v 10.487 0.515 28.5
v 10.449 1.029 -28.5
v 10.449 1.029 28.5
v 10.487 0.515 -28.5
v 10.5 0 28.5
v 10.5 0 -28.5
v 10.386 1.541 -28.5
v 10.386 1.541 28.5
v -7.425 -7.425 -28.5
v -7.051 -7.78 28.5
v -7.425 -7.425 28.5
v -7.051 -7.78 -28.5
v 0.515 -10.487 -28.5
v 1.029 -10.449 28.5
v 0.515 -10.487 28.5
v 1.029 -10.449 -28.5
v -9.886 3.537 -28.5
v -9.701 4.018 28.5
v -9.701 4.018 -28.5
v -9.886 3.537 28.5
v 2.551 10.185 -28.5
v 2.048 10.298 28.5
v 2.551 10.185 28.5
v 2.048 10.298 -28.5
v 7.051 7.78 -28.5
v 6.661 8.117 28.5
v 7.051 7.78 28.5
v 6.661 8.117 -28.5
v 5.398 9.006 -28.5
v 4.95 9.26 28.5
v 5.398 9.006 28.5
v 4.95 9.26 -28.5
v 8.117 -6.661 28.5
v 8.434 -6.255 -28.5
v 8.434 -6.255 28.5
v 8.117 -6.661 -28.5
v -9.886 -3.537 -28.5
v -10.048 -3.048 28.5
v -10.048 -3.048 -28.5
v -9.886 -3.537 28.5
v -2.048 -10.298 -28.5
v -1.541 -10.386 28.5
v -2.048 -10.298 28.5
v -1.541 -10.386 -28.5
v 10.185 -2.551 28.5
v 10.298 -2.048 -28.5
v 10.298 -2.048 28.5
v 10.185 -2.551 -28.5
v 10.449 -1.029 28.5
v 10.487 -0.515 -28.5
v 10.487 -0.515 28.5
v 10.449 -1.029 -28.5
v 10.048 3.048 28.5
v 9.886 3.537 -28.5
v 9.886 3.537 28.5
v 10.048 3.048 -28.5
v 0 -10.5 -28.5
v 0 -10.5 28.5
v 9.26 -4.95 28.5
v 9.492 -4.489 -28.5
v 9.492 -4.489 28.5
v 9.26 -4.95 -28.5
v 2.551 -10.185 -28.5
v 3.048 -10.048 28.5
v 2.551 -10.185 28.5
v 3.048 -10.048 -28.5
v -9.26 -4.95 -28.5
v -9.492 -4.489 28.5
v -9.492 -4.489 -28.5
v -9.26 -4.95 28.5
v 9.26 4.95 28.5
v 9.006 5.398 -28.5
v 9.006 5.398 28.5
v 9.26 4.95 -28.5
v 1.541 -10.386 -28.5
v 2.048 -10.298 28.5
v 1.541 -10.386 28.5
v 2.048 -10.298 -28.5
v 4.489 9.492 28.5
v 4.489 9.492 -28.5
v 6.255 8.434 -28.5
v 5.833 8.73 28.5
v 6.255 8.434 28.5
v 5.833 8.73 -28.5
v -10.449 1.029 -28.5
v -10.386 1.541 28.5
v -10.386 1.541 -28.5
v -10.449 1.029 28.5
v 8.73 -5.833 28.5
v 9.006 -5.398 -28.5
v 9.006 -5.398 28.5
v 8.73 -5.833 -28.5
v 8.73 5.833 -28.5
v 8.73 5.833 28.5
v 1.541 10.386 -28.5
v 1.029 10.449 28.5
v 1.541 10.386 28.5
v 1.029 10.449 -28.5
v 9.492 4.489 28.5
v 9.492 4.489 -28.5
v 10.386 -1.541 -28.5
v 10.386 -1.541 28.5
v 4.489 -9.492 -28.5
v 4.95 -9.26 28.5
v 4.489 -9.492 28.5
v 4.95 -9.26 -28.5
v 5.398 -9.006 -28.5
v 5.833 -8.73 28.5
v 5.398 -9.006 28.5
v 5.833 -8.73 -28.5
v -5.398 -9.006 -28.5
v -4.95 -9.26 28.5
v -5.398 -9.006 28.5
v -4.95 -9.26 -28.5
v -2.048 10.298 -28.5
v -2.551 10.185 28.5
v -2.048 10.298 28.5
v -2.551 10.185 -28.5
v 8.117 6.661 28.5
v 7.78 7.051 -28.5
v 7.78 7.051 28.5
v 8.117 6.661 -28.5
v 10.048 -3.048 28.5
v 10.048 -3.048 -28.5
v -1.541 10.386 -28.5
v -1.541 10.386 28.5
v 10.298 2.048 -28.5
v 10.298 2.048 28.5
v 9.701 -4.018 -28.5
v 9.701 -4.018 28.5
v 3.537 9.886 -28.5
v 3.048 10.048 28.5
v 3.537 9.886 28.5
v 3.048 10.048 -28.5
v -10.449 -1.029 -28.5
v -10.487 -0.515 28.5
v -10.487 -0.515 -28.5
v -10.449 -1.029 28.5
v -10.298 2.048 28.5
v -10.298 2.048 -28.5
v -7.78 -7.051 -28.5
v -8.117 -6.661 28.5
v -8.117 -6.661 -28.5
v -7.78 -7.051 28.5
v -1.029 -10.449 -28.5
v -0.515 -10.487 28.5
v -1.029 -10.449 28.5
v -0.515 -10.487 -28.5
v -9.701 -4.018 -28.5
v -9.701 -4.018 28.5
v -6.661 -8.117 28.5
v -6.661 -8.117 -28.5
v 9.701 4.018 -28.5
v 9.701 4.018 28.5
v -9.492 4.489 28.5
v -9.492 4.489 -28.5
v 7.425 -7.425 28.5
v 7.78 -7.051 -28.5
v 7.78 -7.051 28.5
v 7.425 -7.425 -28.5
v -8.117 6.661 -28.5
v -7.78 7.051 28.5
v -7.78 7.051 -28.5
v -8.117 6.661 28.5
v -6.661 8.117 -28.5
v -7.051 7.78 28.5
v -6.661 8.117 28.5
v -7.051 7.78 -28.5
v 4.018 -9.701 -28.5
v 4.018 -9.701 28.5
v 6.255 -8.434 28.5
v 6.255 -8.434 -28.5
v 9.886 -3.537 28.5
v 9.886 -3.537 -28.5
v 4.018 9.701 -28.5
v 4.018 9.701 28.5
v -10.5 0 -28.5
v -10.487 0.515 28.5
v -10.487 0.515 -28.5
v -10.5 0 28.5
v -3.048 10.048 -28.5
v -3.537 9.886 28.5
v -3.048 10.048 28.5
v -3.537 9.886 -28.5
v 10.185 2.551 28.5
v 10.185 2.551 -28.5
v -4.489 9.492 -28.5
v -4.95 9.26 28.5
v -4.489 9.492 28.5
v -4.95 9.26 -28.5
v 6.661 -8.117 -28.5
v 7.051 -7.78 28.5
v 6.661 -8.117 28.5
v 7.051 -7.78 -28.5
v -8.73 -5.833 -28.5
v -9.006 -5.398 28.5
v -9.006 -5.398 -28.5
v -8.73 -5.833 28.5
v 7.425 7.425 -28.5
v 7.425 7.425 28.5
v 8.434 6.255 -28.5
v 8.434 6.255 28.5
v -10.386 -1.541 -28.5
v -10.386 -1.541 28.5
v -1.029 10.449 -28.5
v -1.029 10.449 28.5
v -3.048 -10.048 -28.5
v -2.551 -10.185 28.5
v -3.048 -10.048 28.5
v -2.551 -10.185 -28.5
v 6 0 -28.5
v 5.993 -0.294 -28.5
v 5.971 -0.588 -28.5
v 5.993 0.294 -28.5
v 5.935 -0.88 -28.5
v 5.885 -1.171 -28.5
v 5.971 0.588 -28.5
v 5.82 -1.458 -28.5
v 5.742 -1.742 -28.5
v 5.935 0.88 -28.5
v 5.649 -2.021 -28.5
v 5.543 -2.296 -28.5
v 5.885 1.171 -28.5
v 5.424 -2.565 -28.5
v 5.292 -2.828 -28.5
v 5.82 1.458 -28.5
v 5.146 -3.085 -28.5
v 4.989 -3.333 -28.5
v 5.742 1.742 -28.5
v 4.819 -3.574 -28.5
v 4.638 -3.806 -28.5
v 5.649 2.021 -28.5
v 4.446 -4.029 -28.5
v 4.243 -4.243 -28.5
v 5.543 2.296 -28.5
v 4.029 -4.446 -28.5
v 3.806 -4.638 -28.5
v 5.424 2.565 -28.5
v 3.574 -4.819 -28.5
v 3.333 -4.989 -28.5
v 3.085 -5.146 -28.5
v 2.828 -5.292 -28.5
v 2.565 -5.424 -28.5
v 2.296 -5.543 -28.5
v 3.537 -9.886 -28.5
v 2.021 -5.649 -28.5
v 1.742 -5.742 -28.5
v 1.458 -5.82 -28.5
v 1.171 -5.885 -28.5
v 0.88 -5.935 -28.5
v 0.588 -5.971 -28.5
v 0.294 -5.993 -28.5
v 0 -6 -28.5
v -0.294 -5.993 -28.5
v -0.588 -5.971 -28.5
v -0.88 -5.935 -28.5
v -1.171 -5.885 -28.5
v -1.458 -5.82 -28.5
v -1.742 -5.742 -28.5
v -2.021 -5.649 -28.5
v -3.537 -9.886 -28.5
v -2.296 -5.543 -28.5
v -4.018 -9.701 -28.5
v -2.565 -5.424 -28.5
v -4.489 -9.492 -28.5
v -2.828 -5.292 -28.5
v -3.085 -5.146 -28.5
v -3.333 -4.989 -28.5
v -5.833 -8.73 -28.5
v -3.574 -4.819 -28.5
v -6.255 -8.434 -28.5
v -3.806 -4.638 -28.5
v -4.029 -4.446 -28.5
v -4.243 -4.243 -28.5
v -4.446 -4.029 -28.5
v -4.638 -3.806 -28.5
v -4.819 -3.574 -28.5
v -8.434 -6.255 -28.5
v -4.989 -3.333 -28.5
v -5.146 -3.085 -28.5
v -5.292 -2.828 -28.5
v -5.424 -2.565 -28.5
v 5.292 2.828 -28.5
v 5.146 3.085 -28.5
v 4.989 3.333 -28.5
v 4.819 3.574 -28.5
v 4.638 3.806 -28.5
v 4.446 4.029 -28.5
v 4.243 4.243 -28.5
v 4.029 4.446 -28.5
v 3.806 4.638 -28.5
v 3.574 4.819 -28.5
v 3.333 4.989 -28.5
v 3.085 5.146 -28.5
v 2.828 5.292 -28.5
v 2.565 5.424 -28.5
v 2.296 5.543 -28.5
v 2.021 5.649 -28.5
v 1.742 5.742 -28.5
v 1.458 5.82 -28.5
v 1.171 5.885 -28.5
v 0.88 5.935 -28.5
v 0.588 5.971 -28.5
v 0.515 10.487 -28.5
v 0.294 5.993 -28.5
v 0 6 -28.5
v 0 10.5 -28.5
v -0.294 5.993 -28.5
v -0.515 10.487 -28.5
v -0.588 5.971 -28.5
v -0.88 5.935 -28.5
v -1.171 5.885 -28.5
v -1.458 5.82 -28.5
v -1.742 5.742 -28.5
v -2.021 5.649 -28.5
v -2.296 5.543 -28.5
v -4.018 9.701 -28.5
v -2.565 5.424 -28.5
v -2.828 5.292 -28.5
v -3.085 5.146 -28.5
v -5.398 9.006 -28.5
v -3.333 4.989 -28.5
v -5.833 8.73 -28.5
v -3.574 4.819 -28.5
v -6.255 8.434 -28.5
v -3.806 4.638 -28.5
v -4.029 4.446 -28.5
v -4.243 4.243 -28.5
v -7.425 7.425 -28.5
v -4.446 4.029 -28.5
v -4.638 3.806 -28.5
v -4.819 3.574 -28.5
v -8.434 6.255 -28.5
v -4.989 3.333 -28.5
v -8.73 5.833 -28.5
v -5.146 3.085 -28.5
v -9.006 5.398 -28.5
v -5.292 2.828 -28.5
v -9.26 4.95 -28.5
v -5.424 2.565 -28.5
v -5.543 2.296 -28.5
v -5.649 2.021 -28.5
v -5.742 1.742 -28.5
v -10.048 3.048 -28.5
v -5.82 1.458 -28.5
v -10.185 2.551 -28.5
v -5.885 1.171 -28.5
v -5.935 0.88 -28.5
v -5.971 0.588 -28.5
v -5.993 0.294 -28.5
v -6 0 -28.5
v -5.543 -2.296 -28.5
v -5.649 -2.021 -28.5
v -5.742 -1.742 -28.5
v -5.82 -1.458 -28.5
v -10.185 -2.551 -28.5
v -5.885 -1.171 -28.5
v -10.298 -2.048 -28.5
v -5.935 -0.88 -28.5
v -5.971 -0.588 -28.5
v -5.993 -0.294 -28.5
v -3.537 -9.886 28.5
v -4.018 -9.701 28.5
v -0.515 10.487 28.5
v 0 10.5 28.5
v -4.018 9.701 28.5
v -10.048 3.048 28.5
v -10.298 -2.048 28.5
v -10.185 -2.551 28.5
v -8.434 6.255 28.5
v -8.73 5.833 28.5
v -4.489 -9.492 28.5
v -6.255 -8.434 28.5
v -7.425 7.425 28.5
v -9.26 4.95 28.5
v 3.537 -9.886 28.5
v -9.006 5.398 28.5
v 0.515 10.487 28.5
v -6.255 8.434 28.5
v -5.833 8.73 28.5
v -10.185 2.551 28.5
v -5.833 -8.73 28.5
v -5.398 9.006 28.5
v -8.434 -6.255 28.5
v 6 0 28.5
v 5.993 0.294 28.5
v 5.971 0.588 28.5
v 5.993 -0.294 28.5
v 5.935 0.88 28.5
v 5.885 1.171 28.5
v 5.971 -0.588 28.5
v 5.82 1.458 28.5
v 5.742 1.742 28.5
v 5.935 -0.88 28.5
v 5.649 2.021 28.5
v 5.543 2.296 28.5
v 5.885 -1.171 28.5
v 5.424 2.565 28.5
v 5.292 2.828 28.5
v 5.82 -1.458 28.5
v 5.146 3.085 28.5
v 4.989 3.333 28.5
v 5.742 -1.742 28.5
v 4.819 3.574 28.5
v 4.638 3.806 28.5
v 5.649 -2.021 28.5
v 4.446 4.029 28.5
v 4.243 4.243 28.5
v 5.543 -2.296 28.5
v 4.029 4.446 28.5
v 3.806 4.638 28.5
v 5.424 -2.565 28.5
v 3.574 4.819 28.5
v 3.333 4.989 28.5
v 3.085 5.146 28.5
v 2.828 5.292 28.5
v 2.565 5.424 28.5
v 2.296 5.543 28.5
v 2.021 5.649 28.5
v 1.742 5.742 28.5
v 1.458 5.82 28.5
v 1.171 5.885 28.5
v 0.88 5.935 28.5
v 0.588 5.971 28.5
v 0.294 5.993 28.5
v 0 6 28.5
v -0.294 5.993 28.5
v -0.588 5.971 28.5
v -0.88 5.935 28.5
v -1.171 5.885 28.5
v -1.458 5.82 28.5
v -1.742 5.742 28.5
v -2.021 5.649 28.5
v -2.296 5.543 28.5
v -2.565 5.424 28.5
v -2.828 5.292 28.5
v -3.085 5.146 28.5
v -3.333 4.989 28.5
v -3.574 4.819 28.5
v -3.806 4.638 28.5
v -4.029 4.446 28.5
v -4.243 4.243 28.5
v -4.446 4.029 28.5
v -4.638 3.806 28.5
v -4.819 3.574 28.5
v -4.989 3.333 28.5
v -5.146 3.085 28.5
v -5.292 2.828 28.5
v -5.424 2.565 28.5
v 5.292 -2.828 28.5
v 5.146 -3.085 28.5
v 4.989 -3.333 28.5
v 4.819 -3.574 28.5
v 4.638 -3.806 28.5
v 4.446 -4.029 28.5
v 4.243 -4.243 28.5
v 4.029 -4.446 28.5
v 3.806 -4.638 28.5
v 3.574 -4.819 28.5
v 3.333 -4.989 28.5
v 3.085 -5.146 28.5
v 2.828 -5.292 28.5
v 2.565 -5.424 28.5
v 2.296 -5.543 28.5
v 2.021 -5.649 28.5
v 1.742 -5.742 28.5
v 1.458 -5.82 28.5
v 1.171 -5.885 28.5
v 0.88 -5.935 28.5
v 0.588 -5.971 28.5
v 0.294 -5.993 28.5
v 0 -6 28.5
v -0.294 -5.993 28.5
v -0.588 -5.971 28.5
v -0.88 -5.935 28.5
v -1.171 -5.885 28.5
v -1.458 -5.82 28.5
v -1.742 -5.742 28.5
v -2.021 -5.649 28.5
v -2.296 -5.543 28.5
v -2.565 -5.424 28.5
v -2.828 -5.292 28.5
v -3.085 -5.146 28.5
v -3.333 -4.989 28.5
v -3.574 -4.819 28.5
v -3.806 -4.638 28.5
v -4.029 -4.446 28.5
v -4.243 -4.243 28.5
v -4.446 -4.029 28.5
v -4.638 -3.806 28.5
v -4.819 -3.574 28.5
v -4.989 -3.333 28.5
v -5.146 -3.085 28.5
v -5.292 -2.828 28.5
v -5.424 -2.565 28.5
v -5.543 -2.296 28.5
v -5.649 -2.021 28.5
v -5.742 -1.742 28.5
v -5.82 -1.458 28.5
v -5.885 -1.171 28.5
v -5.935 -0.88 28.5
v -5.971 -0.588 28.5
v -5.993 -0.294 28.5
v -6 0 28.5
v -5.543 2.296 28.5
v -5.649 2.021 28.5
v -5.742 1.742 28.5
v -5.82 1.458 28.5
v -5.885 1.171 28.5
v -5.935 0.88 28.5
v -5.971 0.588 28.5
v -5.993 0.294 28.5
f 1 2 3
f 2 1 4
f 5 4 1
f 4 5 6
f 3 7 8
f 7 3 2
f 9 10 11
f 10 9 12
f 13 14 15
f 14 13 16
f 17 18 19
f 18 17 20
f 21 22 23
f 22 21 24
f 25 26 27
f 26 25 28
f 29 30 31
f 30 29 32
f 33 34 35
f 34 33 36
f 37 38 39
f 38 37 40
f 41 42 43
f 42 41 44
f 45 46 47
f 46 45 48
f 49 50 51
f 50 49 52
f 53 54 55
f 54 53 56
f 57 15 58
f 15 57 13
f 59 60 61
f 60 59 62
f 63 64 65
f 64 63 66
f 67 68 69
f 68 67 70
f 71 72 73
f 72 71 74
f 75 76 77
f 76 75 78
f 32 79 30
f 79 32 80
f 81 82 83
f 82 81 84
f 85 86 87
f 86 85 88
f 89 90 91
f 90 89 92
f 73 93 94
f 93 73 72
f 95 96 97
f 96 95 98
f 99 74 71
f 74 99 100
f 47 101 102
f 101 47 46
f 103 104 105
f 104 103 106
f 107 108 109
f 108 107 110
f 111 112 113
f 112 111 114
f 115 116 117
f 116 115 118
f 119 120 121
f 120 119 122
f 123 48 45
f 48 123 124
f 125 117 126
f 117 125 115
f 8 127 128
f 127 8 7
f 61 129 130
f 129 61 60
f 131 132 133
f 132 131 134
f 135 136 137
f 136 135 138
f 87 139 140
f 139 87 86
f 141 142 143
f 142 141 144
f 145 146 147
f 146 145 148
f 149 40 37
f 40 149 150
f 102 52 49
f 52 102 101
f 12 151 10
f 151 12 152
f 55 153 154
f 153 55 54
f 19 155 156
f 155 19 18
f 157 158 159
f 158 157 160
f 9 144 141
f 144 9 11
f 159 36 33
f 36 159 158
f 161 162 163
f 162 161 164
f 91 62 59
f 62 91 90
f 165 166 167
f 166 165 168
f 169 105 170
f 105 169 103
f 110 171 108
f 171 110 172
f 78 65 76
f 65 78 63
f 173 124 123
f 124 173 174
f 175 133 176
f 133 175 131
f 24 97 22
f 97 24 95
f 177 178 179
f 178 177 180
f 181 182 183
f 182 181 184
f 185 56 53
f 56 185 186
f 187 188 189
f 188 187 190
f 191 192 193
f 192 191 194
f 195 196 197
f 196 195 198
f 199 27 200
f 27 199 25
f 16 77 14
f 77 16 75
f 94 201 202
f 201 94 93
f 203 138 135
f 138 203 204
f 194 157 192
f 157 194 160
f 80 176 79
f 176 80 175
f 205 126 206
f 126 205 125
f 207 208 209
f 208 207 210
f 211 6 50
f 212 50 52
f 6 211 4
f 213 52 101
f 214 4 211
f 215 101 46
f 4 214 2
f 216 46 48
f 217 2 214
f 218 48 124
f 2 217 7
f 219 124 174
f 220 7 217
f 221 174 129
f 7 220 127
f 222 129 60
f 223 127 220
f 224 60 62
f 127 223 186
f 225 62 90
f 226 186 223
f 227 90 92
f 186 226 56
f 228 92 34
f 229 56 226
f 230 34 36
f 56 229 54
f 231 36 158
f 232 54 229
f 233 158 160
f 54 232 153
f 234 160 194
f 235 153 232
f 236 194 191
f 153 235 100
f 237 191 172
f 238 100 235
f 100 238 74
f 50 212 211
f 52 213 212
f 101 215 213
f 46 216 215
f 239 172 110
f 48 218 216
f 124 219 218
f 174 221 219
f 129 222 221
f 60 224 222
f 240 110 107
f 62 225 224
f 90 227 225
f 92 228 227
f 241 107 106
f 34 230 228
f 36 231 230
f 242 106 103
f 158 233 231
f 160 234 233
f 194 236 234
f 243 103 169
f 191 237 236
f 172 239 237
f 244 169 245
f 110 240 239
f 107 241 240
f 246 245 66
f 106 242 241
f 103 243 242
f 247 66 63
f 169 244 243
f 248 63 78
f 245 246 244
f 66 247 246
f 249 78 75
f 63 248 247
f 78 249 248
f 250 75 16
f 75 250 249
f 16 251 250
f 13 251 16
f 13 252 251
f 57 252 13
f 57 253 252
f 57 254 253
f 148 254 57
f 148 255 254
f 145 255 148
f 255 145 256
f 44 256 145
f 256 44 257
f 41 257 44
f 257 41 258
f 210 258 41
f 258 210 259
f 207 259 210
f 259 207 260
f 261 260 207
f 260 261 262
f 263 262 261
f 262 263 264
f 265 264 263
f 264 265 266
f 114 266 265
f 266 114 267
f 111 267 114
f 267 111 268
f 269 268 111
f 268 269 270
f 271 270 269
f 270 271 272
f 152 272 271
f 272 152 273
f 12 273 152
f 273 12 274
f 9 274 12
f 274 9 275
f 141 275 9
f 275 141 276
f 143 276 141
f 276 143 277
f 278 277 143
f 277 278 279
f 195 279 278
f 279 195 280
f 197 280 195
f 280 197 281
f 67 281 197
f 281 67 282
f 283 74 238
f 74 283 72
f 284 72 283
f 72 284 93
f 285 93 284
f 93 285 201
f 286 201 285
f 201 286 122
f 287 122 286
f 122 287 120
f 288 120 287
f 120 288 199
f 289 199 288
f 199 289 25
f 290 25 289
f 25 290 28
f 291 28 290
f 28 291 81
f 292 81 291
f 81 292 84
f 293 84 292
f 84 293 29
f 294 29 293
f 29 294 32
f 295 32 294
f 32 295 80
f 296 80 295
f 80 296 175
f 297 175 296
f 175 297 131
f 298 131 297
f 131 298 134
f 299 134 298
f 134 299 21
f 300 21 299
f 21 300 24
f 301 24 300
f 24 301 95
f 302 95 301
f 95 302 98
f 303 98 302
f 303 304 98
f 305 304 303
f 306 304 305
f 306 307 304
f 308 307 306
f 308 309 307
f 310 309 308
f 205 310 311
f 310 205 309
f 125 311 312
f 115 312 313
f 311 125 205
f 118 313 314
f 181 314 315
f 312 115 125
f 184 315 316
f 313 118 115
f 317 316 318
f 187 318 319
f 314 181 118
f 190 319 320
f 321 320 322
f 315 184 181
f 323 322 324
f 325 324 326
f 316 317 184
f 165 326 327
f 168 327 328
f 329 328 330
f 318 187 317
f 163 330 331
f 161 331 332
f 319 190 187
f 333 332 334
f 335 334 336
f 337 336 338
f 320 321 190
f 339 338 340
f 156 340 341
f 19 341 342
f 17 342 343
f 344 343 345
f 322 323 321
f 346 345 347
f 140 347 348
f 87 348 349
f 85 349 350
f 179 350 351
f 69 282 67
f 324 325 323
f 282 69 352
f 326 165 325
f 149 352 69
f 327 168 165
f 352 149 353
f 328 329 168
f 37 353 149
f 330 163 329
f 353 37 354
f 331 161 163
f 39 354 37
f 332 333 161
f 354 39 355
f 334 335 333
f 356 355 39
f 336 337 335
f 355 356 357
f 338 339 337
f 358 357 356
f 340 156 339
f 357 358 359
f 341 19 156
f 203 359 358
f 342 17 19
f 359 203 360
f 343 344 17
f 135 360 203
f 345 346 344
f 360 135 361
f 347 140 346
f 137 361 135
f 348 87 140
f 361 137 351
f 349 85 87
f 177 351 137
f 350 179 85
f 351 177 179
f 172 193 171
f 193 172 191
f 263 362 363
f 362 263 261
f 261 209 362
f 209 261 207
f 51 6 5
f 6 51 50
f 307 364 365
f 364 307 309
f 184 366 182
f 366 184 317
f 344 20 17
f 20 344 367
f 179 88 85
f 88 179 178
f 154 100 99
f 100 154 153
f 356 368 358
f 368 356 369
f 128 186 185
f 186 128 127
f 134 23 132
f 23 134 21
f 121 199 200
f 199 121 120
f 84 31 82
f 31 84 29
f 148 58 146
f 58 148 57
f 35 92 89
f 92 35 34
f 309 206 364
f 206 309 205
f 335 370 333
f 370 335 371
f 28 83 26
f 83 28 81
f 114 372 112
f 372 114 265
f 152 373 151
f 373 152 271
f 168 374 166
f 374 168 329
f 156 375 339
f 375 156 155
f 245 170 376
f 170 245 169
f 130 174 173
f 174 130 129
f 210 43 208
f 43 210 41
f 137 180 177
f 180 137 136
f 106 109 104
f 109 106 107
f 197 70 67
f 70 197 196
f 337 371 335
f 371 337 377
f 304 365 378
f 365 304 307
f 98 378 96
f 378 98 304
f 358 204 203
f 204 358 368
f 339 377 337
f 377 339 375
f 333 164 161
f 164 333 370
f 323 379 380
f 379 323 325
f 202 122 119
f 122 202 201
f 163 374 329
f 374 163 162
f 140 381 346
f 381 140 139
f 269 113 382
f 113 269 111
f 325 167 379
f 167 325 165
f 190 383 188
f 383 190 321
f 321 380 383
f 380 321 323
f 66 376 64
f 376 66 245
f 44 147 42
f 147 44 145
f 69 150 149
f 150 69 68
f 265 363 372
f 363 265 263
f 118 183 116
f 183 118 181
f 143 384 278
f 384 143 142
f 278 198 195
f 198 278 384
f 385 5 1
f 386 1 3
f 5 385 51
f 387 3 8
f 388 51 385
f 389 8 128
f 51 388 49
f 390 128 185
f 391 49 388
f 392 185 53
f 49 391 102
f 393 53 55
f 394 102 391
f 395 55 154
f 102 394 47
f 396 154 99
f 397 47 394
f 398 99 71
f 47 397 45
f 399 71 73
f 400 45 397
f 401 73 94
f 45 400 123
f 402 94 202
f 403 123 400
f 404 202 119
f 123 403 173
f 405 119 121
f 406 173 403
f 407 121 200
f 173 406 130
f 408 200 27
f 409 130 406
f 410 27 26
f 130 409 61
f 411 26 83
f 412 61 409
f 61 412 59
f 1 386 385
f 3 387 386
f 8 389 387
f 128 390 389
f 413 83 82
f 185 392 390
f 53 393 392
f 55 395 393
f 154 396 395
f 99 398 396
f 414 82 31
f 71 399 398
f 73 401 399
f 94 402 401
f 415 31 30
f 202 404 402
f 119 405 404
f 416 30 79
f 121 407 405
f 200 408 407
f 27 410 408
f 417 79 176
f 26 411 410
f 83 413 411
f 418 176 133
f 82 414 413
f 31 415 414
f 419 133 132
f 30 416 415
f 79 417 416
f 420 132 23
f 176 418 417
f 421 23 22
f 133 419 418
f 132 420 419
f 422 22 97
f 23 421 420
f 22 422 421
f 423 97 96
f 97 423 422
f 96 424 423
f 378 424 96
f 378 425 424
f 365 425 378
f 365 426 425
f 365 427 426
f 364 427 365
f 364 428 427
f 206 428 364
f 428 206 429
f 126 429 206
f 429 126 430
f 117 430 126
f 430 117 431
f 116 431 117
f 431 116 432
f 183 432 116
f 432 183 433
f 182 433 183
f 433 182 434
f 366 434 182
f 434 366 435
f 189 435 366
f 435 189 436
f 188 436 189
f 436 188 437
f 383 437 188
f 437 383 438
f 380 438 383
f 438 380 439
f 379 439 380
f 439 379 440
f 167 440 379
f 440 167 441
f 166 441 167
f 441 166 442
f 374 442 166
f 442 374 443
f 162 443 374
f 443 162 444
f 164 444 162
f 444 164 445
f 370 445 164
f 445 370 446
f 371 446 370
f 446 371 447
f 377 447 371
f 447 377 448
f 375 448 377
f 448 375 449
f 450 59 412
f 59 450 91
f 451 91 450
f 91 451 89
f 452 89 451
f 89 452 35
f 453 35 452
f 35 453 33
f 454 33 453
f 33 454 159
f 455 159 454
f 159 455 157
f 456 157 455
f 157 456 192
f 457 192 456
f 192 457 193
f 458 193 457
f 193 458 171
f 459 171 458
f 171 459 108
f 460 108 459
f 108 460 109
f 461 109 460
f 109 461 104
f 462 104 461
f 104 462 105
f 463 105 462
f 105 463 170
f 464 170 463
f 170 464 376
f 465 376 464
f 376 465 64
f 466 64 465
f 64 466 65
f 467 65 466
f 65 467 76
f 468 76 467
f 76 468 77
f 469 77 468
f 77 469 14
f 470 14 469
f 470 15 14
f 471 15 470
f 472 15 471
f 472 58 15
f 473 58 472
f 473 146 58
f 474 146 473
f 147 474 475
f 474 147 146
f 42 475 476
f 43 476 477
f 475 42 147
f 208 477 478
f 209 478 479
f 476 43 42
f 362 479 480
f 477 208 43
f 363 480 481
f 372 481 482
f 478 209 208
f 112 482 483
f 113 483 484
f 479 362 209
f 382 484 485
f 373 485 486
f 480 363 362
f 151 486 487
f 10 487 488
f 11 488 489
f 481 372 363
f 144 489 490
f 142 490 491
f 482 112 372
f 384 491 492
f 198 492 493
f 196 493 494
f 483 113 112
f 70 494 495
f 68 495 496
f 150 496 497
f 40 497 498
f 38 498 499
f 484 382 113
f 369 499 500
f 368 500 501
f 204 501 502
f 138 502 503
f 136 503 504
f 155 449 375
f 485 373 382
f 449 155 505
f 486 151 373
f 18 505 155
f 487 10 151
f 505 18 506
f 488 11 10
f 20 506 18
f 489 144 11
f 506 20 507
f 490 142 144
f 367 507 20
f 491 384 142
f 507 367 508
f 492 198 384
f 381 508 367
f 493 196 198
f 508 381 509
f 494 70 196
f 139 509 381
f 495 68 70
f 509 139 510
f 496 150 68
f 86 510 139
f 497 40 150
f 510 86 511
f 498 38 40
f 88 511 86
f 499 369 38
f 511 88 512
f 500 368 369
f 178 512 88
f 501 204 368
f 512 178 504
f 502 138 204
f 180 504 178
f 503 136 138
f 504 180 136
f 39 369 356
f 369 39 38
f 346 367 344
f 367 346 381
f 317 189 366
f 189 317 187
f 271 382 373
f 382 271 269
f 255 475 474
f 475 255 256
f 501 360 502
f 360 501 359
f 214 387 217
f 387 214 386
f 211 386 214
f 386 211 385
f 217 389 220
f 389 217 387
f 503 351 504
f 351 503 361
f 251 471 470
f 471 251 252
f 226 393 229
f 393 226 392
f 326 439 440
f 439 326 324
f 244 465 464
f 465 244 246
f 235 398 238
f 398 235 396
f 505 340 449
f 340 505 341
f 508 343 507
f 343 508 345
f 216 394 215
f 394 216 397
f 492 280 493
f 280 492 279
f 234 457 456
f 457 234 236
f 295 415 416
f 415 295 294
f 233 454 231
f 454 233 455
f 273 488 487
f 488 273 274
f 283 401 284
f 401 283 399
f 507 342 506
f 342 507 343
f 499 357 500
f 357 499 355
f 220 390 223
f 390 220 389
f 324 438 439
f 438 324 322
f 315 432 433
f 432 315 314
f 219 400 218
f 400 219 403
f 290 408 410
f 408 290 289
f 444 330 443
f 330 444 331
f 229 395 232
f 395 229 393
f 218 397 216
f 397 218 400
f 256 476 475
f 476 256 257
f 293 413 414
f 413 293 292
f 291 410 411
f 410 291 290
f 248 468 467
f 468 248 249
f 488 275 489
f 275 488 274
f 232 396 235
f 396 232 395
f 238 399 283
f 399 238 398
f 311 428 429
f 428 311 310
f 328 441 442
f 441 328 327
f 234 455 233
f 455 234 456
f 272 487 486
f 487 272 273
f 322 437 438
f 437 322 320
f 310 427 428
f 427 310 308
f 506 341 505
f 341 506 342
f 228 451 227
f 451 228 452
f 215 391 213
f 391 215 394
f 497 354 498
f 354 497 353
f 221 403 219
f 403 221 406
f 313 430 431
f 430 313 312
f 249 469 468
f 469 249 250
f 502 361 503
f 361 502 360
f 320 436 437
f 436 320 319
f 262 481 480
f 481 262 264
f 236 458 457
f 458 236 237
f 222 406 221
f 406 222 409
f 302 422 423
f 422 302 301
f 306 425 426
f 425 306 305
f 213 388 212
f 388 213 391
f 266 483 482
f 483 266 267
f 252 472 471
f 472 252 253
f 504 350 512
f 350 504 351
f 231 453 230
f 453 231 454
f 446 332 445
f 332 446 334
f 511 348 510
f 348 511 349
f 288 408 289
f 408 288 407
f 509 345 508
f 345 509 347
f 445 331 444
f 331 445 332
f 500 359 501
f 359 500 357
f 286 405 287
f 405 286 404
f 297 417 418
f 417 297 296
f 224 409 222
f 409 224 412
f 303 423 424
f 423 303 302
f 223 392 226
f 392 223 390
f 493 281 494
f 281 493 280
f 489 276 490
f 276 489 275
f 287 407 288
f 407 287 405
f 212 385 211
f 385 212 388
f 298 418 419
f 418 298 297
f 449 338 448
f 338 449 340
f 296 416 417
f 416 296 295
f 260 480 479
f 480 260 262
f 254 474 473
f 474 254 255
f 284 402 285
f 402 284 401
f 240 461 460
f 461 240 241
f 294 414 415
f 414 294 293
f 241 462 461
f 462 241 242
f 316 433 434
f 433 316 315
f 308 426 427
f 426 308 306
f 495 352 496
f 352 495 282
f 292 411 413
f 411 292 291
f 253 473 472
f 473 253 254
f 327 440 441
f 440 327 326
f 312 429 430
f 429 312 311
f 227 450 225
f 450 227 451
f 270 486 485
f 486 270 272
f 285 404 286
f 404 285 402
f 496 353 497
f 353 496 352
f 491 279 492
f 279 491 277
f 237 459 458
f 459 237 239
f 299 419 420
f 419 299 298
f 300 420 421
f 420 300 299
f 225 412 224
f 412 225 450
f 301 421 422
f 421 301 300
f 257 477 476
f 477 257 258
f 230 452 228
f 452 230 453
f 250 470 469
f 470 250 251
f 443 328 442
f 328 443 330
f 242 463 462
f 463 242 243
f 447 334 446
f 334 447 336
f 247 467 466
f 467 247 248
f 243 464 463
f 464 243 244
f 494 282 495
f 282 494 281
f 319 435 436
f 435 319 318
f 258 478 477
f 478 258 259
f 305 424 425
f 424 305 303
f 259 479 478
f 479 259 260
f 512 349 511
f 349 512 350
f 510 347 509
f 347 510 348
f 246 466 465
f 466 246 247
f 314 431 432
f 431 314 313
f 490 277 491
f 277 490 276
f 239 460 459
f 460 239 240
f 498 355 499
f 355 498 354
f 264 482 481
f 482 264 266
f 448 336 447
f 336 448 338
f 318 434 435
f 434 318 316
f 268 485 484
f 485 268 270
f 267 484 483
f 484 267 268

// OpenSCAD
$fn = 128;

bore_d = 12.0;
od_d   = 21.0;
len    = 57.0;

difference() {
  cylinder(d = od_d, h = len, center = true);
  cylinder(d = bore_d, h = len + 0.2, center = true);
}
